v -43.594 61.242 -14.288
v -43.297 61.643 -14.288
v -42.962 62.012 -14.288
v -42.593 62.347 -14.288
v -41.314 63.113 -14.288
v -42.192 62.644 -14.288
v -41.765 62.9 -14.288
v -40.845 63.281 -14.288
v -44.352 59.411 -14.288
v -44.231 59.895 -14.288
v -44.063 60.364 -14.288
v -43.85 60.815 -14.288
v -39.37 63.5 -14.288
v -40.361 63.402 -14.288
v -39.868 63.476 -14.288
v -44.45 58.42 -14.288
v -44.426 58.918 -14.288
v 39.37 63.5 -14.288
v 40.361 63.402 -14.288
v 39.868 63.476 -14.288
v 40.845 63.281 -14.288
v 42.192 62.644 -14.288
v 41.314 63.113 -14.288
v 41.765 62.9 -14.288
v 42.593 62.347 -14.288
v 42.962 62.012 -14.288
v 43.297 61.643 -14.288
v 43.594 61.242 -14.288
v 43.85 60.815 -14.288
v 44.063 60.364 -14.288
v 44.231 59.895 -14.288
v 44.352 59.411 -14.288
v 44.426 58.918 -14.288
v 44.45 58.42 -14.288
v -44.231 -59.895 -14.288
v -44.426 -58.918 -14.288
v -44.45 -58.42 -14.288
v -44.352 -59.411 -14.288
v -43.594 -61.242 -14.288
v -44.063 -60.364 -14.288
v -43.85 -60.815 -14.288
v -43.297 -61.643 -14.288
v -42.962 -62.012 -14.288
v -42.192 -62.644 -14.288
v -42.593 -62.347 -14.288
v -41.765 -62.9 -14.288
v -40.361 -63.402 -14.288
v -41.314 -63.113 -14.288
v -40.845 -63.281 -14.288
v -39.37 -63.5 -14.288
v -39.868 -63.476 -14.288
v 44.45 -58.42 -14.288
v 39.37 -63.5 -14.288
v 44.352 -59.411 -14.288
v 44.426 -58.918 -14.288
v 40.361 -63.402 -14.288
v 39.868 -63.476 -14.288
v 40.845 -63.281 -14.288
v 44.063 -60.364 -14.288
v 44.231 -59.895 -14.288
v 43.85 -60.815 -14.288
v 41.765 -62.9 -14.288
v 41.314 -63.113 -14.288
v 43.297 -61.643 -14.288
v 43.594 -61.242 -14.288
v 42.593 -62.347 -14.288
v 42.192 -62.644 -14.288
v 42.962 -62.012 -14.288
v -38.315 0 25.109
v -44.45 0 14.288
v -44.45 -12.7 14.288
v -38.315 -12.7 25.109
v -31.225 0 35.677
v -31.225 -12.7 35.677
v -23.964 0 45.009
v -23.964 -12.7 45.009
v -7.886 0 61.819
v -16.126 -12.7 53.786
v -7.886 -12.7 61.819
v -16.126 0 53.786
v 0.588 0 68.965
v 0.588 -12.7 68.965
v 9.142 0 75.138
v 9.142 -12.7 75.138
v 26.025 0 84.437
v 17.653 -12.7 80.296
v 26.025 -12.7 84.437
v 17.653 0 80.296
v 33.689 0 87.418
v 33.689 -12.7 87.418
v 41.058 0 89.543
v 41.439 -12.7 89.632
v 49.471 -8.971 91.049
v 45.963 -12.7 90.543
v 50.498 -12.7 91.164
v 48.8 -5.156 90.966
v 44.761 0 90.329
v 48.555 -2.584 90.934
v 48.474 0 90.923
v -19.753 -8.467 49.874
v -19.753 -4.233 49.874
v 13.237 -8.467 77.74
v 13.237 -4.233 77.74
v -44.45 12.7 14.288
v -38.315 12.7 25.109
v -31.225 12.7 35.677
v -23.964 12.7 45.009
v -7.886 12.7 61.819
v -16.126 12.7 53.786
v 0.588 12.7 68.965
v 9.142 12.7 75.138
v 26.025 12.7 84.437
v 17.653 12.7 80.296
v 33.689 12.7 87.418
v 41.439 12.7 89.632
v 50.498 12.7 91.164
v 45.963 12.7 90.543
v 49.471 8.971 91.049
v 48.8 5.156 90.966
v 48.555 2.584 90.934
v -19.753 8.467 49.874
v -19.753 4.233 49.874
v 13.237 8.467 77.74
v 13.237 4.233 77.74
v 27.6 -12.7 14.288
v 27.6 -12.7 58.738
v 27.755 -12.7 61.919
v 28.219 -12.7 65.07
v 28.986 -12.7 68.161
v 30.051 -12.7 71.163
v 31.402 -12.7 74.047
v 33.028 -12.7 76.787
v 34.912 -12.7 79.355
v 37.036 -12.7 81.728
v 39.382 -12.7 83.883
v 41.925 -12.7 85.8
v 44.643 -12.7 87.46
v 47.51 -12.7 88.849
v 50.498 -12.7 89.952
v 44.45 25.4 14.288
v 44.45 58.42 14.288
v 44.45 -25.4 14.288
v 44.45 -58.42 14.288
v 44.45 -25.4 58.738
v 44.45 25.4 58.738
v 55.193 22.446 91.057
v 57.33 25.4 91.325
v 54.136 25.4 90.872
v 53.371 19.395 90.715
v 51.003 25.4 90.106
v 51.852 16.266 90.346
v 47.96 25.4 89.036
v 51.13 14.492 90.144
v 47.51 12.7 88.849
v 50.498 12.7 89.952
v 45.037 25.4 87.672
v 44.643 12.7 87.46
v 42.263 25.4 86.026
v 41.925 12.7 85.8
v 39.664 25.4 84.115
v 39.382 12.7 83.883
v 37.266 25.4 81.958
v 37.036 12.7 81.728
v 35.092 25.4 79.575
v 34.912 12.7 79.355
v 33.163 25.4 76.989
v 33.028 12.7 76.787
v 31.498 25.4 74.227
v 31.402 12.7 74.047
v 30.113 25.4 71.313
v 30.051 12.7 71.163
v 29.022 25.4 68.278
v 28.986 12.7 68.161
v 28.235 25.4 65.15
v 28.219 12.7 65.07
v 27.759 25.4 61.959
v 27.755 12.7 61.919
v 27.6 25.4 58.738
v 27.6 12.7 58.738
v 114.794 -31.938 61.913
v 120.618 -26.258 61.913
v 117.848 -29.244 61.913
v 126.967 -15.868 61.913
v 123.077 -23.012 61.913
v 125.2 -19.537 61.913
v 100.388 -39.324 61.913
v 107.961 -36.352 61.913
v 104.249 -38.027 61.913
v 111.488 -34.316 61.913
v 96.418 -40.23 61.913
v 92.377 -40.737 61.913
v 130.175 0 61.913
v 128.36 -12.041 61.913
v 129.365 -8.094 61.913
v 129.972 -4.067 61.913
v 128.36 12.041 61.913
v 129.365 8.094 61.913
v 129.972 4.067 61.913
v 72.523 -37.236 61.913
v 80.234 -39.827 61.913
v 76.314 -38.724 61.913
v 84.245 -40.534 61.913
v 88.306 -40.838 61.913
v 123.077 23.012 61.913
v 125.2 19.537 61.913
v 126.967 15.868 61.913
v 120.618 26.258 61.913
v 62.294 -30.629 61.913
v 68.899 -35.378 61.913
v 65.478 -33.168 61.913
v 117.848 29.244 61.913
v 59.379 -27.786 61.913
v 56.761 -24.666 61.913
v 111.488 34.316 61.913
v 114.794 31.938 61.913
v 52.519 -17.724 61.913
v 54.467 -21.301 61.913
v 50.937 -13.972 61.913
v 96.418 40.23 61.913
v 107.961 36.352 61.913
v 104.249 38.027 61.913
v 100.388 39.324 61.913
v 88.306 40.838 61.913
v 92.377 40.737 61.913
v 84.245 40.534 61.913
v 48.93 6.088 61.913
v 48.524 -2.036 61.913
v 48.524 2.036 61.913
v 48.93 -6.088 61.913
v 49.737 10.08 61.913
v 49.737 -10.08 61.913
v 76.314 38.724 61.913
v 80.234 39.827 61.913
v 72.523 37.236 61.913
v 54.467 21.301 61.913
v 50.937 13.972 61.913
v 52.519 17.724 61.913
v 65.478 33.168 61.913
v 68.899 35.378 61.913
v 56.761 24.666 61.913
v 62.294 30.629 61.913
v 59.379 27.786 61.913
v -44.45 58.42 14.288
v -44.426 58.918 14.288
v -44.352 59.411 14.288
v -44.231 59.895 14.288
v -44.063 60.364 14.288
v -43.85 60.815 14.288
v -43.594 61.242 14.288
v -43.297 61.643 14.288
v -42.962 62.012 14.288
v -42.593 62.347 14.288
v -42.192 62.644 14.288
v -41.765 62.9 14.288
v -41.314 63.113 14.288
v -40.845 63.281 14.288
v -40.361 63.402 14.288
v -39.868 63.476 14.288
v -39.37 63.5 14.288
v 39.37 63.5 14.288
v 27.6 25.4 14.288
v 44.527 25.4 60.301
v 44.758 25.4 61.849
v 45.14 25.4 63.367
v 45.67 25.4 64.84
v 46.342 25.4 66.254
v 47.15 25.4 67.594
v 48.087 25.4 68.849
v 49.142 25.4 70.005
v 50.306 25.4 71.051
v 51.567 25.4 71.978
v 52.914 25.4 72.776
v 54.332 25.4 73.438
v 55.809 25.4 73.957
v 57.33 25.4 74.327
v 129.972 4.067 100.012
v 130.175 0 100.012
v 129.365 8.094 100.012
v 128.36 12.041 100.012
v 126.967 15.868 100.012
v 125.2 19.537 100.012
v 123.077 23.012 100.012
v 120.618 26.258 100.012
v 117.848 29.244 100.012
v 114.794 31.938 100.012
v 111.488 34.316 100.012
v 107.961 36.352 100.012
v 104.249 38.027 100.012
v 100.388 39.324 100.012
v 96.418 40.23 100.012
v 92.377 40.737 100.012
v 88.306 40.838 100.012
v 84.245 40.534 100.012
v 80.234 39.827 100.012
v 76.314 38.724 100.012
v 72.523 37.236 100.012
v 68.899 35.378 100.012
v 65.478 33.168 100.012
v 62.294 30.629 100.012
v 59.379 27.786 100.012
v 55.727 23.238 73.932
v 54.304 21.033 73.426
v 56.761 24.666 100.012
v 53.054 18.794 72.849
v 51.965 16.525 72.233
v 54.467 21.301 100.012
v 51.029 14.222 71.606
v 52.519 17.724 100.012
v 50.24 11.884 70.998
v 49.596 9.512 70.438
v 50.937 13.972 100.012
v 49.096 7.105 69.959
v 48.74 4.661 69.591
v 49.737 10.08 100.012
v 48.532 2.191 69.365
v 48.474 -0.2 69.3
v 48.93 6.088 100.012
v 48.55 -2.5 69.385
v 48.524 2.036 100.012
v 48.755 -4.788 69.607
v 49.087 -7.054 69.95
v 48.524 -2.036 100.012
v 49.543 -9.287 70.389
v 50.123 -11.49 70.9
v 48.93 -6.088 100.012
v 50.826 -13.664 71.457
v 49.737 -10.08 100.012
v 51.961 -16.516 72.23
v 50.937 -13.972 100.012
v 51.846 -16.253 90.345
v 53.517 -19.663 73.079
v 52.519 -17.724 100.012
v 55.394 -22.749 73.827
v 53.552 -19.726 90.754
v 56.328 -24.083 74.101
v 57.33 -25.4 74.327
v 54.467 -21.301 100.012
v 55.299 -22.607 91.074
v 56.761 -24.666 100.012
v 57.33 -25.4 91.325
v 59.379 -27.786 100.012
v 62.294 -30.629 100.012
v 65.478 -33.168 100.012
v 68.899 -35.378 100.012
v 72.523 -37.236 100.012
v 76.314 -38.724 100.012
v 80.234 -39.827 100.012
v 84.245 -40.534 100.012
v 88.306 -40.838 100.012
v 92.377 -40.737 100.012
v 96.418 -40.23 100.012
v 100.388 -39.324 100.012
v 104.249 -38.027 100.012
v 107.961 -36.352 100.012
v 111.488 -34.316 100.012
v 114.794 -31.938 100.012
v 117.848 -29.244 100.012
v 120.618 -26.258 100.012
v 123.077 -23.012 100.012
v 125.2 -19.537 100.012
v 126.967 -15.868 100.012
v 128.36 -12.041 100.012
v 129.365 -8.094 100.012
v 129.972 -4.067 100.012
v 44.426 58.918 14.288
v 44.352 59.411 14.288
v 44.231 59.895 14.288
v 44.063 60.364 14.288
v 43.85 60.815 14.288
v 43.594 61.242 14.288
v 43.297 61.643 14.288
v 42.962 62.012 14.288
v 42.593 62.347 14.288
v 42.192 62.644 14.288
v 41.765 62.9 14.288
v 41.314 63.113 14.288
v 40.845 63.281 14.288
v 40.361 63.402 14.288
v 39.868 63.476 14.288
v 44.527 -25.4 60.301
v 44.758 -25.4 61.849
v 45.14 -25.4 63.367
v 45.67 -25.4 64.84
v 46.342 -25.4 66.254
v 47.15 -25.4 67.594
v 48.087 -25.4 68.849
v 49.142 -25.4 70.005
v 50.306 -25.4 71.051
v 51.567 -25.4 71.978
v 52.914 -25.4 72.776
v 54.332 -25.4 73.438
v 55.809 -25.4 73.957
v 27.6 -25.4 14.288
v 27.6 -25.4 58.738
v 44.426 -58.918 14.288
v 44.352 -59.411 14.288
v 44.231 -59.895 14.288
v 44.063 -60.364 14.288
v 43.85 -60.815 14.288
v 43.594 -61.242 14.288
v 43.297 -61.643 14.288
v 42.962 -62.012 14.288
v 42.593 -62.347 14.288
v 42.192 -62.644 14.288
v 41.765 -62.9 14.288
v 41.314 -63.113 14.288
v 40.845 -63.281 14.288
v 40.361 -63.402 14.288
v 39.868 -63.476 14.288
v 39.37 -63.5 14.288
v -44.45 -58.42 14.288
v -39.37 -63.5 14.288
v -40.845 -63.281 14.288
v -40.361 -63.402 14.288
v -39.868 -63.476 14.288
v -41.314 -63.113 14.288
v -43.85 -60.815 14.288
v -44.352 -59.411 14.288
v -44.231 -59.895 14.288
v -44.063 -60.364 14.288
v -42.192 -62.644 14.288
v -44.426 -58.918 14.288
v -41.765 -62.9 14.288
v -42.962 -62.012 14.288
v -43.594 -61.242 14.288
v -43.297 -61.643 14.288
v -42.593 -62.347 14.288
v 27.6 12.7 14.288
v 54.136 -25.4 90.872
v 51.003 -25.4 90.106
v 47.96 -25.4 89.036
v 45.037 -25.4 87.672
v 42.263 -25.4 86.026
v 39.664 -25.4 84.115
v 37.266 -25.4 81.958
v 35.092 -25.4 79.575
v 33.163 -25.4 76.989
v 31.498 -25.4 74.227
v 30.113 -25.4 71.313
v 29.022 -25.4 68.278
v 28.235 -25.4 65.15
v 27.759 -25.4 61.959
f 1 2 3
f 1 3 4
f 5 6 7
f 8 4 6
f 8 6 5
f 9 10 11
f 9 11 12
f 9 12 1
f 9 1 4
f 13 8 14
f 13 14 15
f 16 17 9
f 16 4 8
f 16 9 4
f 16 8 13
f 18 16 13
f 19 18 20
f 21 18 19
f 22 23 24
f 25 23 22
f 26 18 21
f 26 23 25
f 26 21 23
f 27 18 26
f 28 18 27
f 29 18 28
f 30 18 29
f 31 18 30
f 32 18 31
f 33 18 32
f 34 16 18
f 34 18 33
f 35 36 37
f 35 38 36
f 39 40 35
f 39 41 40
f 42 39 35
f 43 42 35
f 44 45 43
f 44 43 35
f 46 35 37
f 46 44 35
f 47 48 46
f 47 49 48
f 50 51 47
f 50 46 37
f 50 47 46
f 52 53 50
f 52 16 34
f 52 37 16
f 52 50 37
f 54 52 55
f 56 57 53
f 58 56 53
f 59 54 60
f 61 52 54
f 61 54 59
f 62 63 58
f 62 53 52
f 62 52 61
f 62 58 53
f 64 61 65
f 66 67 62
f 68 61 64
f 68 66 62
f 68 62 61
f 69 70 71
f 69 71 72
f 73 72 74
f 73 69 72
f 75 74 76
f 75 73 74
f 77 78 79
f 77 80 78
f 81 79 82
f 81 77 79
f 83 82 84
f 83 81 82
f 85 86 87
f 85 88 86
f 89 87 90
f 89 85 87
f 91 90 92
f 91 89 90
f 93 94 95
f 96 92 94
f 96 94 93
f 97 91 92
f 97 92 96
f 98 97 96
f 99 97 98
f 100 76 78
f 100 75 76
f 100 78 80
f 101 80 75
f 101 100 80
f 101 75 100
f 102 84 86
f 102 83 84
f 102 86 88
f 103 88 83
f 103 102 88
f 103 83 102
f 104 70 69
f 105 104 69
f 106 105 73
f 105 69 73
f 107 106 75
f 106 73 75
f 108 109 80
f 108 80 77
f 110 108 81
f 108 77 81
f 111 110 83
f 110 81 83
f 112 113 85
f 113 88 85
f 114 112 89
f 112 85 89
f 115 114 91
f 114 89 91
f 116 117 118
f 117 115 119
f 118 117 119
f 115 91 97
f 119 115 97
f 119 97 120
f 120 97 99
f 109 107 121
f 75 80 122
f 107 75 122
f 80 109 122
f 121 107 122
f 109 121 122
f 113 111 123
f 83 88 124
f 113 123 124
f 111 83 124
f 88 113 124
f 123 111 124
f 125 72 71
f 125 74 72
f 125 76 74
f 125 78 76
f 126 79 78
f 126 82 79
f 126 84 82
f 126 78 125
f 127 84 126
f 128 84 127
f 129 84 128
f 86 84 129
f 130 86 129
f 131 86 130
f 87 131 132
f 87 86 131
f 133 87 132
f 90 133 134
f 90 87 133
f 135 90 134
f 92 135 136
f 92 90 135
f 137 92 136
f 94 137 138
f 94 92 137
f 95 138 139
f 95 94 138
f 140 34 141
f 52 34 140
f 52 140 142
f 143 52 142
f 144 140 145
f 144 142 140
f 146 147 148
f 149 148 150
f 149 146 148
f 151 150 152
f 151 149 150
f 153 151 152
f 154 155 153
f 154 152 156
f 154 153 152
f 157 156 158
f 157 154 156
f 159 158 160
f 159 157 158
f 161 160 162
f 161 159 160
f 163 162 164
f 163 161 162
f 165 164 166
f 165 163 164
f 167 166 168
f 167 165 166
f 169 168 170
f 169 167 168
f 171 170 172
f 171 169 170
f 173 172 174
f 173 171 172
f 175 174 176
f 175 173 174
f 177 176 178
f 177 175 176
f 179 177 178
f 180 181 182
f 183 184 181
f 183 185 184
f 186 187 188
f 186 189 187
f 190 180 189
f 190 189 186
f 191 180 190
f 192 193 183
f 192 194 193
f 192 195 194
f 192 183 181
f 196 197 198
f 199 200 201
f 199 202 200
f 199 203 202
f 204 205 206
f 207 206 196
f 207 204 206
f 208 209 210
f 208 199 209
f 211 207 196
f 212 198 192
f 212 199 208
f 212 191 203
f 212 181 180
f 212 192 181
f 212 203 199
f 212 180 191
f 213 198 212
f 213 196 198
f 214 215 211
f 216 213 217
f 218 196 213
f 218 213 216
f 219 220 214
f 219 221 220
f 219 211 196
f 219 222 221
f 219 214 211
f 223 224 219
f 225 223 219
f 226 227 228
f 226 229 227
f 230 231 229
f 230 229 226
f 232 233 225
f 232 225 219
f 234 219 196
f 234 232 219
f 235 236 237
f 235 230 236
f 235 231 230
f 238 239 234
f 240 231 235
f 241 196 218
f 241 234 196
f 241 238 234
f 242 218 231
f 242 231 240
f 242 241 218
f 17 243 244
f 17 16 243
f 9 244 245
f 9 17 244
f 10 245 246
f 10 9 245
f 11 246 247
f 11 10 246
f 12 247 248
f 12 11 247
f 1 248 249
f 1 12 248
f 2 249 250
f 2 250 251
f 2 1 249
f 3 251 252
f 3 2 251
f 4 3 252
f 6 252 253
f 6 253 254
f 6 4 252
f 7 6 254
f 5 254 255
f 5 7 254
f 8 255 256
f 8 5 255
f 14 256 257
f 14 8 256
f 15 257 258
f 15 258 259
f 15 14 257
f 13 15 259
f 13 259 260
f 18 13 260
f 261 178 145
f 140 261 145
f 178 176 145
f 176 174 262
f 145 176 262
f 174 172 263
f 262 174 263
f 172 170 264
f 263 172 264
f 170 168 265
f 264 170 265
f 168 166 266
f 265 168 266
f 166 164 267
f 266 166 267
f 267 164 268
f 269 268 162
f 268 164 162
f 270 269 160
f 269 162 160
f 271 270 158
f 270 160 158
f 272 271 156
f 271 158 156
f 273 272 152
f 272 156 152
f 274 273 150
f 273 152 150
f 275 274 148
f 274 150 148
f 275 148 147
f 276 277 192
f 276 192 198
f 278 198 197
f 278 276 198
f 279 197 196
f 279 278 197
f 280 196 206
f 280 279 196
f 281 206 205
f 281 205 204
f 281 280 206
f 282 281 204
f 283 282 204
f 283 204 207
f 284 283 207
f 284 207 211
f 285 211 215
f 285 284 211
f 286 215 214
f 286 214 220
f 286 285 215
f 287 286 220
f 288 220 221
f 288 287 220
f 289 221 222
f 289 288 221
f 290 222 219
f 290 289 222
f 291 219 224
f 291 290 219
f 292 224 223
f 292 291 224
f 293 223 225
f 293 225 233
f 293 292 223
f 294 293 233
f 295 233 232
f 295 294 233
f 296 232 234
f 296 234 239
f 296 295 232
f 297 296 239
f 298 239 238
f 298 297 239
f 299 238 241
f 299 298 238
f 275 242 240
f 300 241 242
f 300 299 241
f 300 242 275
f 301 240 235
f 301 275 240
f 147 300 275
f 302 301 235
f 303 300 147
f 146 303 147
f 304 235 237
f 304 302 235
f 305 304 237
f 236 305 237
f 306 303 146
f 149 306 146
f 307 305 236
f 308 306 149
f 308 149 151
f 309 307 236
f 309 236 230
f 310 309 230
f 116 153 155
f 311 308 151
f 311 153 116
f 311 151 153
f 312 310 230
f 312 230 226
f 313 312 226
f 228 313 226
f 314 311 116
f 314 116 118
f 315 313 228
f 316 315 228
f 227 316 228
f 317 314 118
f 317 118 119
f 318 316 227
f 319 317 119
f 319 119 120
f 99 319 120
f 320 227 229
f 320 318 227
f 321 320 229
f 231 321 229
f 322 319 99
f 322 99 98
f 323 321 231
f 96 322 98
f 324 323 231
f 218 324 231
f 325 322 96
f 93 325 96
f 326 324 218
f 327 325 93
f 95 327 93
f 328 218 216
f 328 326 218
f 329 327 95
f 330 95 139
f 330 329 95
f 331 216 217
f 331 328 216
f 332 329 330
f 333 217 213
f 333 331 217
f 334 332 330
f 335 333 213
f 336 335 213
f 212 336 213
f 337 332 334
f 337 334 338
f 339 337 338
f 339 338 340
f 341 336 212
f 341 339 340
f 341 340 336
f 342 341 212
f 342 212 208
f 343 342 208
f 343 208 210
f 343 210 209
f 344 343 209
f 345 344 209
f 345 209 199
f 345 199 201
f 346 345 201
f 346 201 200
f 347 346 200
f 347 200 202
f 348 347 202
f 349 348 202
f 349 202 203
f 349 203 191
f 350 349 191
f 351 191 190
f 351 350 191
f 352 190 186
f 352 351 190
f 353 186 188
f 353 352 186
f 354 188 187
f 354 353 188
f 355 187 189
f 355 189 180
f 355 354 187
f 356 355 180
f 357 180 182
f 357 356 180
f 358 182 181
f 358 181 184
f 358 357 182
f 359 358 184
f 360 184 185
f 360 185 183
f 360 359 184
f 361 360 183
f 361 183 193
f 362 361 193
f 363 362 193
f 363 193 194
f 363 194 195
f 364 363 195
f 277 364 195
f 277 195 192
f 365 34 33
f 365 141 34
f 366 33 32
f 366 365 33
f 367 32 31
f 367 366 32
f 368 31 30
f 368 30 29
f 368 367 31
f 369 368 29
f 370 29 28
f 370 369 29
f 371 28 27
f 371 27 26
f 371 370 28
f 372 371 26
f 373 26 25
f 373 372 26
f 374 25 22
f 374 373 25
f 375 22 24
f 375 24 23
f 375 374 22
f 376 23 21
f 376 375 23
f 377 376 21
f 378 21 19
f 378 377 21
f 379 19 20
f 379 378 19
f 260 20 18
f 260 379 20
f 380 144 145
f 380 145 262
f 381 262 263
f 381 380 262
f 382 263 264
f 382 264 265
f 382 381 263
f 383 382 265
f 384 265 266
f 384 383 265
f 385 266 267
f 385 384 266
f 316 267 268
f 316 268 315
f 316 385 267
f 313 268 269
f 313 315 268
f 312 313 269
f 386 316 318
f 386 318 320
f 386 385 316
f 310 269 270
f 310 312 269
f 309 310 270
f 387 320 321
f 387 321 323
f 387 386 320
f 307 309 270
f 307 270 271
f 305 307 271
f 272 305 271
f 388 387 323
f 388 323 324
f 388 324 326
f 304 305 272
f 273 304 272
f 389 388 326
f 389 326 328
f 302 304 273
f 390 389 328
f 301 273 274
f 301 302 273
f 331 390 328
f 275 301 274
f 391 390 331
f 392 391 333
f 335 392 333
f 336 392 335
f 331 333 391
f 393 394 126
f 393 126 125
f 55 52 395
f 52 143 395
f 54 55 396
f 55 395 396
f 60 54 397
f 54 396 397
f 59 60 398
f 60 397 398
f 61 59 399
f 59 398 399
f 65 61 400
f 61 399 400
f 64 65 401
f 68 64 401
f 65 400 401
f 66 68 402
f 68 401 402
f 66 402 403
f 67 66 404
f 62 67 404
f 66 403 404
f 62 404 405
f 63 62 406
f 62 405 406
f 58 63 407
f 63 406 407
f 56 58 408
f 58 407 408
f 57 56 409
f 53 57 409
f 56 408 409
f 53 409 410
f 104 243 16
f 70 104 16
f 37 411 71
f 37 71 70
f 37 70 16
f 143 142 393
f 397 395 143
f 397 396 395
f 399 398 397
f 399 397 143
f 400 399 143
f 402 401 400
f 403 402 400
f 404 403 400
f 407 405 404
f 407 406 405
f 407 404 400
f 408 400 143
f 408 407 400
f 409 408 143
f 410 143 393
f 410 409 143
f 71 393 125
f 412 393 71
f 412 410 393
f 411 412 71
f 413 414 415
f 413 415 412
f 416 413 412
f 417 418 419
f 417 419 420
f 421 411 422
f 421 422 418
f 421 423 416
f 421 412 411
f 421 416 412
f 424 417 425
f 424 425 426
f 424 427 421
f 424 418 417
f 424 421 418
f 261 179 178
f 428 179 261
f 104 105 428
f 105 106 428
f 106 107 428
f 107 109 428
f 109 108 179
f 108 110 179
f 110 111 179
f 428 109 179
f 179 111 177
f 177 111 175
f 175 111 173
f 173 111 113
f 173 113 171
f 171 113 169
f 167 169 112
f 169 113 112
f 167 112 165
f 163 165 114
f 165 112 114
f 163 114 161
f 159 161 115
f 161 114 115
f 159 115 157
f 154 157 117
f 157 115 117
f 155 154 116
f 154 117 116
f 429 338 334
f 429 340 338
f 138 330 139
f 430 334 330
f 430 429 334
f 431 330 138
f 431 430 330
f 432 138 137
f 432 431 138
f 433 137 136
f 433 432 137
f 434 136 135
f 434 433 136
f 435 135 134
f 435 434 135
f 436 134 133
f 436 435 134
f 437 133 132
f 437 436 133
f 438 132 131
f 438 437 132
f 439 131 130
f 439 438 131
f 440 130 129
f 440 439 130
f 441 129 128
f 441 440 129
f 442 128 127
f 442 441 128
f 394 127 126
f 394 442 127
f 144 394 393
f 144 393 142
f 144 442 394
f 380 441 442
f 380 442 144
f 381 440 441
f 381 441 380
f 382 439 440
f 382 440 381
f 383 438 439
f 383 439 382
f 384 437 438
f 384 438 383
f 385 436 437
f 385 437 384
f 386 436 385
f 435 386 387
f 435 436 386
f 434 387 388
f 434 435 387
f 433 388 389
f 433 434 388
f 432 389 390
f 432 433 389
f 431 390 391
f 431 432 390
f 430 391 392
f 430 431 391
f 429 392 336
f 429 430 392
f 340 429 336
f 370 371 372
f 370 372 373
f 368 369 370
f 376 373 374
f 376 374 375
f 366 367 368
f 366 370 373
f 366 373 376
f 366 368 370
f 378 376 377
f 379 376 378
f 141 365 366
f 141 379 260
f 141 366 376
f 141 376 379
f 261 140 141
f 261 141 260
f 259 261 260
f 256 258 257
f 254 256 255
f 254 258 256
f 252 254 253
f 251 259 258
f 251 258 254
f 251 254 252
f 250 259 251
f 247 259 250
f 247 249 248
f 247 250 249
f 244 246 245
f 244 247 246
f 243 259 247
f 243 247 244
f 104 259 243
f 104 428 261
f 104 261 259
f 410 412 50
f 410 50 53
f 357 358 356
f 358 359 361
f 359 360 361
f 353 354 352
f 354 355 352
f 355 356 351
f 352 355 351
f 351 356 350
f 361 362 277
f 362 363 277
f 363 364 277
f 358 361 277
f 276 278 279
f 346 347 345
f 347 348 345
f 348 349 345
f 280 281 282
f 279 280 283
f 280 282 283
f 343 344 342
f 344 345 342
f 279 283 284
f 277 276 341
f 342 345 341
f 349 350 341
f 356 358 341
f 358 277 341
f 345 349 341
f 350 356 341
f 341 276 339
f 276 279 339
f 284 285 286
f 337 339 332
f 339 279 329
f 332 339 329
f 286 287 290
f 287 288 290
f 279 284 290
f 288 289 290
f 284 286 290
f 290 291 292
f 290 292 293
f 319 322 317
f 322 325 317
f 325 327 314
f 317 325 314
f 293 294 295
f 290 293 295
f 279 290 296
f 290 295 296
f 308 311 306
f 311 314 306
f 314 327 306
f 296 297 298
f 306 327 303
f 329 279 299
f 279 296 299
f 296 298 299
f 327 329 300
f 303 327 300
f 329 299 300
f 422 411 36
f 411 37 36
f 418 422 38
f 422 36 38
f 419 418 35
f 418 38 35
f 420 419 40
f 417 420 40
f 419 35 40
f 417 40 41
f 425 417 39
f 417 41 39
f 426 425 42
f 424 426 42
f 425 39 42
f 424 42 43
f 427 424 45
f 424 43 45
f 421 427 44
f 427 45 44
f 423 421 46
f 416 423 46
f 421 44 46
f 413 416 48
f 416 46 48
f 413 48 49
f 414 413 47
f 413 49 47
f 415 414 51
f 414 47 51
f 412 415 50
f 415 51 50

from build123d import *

# Parameters (mm, degrees)
F1_DEPTH = 63.5
F2_DEPTH = 25.4
F3_DEPTH = 12.7
F0_W     = 40.8507403036
F0_H     = 38.1
F5_R     = 5.08


with BuildPart() as f1:
    # F0 (on Front) → F1 (new body, symmetric)
    with BuildSketch(Plane.XZ):
        Polygon((44.45, -14.2875), (44.45, 14.2875), (27.6001971215, 14.2875), (-44.45, 14.2875), (-44.45, -14.2875), align=None)
    extrude(amount=F1_DEPTH, both=True)

    # F0 (on Front) → F2 (join, symmetric)
    with BuildSketch(Plane.XZ):
        with BuildLine():
            Line((27.6001971215, 14.2875), (44.45, 14.2875))
            Line((44.45, 14.2875), (44.45, 58.7375))
            ThreePointArc((44.45, 58.7375), (49.0996798487, 69.9628201513), (60.325, 74.6125))
            Line((60.325, 74.6125), (66.6749985714, 74.6125))
            Line((66.6749985714, 74.6125), (66.6749985714, 91.4623028785))
            Line((66.6749985714, 91.4623028785), (60.325, 91.4623028785))
            ThreePointArc((60.325, 91.4623028785), (37.1850699716, 81.8774300284), (27.6001971215, 58.7375))
            Line((27.6001971215, 58.7375), (27.6001971215, 14.2875))
        make_face()
        Polygon((66.6749985714, 91.4623028785), (66.6749985714, 74.6125), (66.6749985714, 61.9125), (89.3242582679, 61.9125), (89.3242582679, 100.0125), (66.6749985714, 100.0125), align=None)
    extrude(amount=F2_DEPTH, both=True)

    # F0 (on Front) → F3 (join, symmetric)
    with BuildSketch(Plane.XZ):
        with BuildLine():
            Line((-44.45, 14.2875), (27.6001971215, 14.2875))
            Line((27.6001971215, 14.2875), (27.6001971215, 58.7375))
            ThreePointArc((27.6001971215, 58.7375), (37.1850699716, 81.8774300284), (60.325, 91.4623028785))
            add(Edge.make_bspline(
                [(-44.45, 14.2875), (-23.5856175423, 54.6985641122), (19.0692264587, 93.3388397098), (60.325, 91.4623028785)],
                knots=[0, 0, 0, 0, 130.1297461165, 130.1297461165, 130.1297461165, 130.1297461165], degree=3))
        make_face()
    extrude(amount=F3_DEPTH, both=True)

    # F0 (on Front) → F4 (revolve)
    with BuildSketch(Plane.XZ):
        with Locations((109.7496284197, 80.9625)):
            Rectangle(F0_W, F0_H)
    revolve(axis=Axis((89.3242582679, 0, 80.9625), (0, 0, 1)))

    # F5
    f5_edges = [f1.edges().sort_by_distance(p)[0] for p in [
        (44.45, -63.5, 0),
        (-44.45, -63.5, 0),
        (44.45, 63.5, 0),
        (-44.45, 63.5, 0),
    ]]
    fillet(f5_edges, radius=F5_R)


solid = f1.part
